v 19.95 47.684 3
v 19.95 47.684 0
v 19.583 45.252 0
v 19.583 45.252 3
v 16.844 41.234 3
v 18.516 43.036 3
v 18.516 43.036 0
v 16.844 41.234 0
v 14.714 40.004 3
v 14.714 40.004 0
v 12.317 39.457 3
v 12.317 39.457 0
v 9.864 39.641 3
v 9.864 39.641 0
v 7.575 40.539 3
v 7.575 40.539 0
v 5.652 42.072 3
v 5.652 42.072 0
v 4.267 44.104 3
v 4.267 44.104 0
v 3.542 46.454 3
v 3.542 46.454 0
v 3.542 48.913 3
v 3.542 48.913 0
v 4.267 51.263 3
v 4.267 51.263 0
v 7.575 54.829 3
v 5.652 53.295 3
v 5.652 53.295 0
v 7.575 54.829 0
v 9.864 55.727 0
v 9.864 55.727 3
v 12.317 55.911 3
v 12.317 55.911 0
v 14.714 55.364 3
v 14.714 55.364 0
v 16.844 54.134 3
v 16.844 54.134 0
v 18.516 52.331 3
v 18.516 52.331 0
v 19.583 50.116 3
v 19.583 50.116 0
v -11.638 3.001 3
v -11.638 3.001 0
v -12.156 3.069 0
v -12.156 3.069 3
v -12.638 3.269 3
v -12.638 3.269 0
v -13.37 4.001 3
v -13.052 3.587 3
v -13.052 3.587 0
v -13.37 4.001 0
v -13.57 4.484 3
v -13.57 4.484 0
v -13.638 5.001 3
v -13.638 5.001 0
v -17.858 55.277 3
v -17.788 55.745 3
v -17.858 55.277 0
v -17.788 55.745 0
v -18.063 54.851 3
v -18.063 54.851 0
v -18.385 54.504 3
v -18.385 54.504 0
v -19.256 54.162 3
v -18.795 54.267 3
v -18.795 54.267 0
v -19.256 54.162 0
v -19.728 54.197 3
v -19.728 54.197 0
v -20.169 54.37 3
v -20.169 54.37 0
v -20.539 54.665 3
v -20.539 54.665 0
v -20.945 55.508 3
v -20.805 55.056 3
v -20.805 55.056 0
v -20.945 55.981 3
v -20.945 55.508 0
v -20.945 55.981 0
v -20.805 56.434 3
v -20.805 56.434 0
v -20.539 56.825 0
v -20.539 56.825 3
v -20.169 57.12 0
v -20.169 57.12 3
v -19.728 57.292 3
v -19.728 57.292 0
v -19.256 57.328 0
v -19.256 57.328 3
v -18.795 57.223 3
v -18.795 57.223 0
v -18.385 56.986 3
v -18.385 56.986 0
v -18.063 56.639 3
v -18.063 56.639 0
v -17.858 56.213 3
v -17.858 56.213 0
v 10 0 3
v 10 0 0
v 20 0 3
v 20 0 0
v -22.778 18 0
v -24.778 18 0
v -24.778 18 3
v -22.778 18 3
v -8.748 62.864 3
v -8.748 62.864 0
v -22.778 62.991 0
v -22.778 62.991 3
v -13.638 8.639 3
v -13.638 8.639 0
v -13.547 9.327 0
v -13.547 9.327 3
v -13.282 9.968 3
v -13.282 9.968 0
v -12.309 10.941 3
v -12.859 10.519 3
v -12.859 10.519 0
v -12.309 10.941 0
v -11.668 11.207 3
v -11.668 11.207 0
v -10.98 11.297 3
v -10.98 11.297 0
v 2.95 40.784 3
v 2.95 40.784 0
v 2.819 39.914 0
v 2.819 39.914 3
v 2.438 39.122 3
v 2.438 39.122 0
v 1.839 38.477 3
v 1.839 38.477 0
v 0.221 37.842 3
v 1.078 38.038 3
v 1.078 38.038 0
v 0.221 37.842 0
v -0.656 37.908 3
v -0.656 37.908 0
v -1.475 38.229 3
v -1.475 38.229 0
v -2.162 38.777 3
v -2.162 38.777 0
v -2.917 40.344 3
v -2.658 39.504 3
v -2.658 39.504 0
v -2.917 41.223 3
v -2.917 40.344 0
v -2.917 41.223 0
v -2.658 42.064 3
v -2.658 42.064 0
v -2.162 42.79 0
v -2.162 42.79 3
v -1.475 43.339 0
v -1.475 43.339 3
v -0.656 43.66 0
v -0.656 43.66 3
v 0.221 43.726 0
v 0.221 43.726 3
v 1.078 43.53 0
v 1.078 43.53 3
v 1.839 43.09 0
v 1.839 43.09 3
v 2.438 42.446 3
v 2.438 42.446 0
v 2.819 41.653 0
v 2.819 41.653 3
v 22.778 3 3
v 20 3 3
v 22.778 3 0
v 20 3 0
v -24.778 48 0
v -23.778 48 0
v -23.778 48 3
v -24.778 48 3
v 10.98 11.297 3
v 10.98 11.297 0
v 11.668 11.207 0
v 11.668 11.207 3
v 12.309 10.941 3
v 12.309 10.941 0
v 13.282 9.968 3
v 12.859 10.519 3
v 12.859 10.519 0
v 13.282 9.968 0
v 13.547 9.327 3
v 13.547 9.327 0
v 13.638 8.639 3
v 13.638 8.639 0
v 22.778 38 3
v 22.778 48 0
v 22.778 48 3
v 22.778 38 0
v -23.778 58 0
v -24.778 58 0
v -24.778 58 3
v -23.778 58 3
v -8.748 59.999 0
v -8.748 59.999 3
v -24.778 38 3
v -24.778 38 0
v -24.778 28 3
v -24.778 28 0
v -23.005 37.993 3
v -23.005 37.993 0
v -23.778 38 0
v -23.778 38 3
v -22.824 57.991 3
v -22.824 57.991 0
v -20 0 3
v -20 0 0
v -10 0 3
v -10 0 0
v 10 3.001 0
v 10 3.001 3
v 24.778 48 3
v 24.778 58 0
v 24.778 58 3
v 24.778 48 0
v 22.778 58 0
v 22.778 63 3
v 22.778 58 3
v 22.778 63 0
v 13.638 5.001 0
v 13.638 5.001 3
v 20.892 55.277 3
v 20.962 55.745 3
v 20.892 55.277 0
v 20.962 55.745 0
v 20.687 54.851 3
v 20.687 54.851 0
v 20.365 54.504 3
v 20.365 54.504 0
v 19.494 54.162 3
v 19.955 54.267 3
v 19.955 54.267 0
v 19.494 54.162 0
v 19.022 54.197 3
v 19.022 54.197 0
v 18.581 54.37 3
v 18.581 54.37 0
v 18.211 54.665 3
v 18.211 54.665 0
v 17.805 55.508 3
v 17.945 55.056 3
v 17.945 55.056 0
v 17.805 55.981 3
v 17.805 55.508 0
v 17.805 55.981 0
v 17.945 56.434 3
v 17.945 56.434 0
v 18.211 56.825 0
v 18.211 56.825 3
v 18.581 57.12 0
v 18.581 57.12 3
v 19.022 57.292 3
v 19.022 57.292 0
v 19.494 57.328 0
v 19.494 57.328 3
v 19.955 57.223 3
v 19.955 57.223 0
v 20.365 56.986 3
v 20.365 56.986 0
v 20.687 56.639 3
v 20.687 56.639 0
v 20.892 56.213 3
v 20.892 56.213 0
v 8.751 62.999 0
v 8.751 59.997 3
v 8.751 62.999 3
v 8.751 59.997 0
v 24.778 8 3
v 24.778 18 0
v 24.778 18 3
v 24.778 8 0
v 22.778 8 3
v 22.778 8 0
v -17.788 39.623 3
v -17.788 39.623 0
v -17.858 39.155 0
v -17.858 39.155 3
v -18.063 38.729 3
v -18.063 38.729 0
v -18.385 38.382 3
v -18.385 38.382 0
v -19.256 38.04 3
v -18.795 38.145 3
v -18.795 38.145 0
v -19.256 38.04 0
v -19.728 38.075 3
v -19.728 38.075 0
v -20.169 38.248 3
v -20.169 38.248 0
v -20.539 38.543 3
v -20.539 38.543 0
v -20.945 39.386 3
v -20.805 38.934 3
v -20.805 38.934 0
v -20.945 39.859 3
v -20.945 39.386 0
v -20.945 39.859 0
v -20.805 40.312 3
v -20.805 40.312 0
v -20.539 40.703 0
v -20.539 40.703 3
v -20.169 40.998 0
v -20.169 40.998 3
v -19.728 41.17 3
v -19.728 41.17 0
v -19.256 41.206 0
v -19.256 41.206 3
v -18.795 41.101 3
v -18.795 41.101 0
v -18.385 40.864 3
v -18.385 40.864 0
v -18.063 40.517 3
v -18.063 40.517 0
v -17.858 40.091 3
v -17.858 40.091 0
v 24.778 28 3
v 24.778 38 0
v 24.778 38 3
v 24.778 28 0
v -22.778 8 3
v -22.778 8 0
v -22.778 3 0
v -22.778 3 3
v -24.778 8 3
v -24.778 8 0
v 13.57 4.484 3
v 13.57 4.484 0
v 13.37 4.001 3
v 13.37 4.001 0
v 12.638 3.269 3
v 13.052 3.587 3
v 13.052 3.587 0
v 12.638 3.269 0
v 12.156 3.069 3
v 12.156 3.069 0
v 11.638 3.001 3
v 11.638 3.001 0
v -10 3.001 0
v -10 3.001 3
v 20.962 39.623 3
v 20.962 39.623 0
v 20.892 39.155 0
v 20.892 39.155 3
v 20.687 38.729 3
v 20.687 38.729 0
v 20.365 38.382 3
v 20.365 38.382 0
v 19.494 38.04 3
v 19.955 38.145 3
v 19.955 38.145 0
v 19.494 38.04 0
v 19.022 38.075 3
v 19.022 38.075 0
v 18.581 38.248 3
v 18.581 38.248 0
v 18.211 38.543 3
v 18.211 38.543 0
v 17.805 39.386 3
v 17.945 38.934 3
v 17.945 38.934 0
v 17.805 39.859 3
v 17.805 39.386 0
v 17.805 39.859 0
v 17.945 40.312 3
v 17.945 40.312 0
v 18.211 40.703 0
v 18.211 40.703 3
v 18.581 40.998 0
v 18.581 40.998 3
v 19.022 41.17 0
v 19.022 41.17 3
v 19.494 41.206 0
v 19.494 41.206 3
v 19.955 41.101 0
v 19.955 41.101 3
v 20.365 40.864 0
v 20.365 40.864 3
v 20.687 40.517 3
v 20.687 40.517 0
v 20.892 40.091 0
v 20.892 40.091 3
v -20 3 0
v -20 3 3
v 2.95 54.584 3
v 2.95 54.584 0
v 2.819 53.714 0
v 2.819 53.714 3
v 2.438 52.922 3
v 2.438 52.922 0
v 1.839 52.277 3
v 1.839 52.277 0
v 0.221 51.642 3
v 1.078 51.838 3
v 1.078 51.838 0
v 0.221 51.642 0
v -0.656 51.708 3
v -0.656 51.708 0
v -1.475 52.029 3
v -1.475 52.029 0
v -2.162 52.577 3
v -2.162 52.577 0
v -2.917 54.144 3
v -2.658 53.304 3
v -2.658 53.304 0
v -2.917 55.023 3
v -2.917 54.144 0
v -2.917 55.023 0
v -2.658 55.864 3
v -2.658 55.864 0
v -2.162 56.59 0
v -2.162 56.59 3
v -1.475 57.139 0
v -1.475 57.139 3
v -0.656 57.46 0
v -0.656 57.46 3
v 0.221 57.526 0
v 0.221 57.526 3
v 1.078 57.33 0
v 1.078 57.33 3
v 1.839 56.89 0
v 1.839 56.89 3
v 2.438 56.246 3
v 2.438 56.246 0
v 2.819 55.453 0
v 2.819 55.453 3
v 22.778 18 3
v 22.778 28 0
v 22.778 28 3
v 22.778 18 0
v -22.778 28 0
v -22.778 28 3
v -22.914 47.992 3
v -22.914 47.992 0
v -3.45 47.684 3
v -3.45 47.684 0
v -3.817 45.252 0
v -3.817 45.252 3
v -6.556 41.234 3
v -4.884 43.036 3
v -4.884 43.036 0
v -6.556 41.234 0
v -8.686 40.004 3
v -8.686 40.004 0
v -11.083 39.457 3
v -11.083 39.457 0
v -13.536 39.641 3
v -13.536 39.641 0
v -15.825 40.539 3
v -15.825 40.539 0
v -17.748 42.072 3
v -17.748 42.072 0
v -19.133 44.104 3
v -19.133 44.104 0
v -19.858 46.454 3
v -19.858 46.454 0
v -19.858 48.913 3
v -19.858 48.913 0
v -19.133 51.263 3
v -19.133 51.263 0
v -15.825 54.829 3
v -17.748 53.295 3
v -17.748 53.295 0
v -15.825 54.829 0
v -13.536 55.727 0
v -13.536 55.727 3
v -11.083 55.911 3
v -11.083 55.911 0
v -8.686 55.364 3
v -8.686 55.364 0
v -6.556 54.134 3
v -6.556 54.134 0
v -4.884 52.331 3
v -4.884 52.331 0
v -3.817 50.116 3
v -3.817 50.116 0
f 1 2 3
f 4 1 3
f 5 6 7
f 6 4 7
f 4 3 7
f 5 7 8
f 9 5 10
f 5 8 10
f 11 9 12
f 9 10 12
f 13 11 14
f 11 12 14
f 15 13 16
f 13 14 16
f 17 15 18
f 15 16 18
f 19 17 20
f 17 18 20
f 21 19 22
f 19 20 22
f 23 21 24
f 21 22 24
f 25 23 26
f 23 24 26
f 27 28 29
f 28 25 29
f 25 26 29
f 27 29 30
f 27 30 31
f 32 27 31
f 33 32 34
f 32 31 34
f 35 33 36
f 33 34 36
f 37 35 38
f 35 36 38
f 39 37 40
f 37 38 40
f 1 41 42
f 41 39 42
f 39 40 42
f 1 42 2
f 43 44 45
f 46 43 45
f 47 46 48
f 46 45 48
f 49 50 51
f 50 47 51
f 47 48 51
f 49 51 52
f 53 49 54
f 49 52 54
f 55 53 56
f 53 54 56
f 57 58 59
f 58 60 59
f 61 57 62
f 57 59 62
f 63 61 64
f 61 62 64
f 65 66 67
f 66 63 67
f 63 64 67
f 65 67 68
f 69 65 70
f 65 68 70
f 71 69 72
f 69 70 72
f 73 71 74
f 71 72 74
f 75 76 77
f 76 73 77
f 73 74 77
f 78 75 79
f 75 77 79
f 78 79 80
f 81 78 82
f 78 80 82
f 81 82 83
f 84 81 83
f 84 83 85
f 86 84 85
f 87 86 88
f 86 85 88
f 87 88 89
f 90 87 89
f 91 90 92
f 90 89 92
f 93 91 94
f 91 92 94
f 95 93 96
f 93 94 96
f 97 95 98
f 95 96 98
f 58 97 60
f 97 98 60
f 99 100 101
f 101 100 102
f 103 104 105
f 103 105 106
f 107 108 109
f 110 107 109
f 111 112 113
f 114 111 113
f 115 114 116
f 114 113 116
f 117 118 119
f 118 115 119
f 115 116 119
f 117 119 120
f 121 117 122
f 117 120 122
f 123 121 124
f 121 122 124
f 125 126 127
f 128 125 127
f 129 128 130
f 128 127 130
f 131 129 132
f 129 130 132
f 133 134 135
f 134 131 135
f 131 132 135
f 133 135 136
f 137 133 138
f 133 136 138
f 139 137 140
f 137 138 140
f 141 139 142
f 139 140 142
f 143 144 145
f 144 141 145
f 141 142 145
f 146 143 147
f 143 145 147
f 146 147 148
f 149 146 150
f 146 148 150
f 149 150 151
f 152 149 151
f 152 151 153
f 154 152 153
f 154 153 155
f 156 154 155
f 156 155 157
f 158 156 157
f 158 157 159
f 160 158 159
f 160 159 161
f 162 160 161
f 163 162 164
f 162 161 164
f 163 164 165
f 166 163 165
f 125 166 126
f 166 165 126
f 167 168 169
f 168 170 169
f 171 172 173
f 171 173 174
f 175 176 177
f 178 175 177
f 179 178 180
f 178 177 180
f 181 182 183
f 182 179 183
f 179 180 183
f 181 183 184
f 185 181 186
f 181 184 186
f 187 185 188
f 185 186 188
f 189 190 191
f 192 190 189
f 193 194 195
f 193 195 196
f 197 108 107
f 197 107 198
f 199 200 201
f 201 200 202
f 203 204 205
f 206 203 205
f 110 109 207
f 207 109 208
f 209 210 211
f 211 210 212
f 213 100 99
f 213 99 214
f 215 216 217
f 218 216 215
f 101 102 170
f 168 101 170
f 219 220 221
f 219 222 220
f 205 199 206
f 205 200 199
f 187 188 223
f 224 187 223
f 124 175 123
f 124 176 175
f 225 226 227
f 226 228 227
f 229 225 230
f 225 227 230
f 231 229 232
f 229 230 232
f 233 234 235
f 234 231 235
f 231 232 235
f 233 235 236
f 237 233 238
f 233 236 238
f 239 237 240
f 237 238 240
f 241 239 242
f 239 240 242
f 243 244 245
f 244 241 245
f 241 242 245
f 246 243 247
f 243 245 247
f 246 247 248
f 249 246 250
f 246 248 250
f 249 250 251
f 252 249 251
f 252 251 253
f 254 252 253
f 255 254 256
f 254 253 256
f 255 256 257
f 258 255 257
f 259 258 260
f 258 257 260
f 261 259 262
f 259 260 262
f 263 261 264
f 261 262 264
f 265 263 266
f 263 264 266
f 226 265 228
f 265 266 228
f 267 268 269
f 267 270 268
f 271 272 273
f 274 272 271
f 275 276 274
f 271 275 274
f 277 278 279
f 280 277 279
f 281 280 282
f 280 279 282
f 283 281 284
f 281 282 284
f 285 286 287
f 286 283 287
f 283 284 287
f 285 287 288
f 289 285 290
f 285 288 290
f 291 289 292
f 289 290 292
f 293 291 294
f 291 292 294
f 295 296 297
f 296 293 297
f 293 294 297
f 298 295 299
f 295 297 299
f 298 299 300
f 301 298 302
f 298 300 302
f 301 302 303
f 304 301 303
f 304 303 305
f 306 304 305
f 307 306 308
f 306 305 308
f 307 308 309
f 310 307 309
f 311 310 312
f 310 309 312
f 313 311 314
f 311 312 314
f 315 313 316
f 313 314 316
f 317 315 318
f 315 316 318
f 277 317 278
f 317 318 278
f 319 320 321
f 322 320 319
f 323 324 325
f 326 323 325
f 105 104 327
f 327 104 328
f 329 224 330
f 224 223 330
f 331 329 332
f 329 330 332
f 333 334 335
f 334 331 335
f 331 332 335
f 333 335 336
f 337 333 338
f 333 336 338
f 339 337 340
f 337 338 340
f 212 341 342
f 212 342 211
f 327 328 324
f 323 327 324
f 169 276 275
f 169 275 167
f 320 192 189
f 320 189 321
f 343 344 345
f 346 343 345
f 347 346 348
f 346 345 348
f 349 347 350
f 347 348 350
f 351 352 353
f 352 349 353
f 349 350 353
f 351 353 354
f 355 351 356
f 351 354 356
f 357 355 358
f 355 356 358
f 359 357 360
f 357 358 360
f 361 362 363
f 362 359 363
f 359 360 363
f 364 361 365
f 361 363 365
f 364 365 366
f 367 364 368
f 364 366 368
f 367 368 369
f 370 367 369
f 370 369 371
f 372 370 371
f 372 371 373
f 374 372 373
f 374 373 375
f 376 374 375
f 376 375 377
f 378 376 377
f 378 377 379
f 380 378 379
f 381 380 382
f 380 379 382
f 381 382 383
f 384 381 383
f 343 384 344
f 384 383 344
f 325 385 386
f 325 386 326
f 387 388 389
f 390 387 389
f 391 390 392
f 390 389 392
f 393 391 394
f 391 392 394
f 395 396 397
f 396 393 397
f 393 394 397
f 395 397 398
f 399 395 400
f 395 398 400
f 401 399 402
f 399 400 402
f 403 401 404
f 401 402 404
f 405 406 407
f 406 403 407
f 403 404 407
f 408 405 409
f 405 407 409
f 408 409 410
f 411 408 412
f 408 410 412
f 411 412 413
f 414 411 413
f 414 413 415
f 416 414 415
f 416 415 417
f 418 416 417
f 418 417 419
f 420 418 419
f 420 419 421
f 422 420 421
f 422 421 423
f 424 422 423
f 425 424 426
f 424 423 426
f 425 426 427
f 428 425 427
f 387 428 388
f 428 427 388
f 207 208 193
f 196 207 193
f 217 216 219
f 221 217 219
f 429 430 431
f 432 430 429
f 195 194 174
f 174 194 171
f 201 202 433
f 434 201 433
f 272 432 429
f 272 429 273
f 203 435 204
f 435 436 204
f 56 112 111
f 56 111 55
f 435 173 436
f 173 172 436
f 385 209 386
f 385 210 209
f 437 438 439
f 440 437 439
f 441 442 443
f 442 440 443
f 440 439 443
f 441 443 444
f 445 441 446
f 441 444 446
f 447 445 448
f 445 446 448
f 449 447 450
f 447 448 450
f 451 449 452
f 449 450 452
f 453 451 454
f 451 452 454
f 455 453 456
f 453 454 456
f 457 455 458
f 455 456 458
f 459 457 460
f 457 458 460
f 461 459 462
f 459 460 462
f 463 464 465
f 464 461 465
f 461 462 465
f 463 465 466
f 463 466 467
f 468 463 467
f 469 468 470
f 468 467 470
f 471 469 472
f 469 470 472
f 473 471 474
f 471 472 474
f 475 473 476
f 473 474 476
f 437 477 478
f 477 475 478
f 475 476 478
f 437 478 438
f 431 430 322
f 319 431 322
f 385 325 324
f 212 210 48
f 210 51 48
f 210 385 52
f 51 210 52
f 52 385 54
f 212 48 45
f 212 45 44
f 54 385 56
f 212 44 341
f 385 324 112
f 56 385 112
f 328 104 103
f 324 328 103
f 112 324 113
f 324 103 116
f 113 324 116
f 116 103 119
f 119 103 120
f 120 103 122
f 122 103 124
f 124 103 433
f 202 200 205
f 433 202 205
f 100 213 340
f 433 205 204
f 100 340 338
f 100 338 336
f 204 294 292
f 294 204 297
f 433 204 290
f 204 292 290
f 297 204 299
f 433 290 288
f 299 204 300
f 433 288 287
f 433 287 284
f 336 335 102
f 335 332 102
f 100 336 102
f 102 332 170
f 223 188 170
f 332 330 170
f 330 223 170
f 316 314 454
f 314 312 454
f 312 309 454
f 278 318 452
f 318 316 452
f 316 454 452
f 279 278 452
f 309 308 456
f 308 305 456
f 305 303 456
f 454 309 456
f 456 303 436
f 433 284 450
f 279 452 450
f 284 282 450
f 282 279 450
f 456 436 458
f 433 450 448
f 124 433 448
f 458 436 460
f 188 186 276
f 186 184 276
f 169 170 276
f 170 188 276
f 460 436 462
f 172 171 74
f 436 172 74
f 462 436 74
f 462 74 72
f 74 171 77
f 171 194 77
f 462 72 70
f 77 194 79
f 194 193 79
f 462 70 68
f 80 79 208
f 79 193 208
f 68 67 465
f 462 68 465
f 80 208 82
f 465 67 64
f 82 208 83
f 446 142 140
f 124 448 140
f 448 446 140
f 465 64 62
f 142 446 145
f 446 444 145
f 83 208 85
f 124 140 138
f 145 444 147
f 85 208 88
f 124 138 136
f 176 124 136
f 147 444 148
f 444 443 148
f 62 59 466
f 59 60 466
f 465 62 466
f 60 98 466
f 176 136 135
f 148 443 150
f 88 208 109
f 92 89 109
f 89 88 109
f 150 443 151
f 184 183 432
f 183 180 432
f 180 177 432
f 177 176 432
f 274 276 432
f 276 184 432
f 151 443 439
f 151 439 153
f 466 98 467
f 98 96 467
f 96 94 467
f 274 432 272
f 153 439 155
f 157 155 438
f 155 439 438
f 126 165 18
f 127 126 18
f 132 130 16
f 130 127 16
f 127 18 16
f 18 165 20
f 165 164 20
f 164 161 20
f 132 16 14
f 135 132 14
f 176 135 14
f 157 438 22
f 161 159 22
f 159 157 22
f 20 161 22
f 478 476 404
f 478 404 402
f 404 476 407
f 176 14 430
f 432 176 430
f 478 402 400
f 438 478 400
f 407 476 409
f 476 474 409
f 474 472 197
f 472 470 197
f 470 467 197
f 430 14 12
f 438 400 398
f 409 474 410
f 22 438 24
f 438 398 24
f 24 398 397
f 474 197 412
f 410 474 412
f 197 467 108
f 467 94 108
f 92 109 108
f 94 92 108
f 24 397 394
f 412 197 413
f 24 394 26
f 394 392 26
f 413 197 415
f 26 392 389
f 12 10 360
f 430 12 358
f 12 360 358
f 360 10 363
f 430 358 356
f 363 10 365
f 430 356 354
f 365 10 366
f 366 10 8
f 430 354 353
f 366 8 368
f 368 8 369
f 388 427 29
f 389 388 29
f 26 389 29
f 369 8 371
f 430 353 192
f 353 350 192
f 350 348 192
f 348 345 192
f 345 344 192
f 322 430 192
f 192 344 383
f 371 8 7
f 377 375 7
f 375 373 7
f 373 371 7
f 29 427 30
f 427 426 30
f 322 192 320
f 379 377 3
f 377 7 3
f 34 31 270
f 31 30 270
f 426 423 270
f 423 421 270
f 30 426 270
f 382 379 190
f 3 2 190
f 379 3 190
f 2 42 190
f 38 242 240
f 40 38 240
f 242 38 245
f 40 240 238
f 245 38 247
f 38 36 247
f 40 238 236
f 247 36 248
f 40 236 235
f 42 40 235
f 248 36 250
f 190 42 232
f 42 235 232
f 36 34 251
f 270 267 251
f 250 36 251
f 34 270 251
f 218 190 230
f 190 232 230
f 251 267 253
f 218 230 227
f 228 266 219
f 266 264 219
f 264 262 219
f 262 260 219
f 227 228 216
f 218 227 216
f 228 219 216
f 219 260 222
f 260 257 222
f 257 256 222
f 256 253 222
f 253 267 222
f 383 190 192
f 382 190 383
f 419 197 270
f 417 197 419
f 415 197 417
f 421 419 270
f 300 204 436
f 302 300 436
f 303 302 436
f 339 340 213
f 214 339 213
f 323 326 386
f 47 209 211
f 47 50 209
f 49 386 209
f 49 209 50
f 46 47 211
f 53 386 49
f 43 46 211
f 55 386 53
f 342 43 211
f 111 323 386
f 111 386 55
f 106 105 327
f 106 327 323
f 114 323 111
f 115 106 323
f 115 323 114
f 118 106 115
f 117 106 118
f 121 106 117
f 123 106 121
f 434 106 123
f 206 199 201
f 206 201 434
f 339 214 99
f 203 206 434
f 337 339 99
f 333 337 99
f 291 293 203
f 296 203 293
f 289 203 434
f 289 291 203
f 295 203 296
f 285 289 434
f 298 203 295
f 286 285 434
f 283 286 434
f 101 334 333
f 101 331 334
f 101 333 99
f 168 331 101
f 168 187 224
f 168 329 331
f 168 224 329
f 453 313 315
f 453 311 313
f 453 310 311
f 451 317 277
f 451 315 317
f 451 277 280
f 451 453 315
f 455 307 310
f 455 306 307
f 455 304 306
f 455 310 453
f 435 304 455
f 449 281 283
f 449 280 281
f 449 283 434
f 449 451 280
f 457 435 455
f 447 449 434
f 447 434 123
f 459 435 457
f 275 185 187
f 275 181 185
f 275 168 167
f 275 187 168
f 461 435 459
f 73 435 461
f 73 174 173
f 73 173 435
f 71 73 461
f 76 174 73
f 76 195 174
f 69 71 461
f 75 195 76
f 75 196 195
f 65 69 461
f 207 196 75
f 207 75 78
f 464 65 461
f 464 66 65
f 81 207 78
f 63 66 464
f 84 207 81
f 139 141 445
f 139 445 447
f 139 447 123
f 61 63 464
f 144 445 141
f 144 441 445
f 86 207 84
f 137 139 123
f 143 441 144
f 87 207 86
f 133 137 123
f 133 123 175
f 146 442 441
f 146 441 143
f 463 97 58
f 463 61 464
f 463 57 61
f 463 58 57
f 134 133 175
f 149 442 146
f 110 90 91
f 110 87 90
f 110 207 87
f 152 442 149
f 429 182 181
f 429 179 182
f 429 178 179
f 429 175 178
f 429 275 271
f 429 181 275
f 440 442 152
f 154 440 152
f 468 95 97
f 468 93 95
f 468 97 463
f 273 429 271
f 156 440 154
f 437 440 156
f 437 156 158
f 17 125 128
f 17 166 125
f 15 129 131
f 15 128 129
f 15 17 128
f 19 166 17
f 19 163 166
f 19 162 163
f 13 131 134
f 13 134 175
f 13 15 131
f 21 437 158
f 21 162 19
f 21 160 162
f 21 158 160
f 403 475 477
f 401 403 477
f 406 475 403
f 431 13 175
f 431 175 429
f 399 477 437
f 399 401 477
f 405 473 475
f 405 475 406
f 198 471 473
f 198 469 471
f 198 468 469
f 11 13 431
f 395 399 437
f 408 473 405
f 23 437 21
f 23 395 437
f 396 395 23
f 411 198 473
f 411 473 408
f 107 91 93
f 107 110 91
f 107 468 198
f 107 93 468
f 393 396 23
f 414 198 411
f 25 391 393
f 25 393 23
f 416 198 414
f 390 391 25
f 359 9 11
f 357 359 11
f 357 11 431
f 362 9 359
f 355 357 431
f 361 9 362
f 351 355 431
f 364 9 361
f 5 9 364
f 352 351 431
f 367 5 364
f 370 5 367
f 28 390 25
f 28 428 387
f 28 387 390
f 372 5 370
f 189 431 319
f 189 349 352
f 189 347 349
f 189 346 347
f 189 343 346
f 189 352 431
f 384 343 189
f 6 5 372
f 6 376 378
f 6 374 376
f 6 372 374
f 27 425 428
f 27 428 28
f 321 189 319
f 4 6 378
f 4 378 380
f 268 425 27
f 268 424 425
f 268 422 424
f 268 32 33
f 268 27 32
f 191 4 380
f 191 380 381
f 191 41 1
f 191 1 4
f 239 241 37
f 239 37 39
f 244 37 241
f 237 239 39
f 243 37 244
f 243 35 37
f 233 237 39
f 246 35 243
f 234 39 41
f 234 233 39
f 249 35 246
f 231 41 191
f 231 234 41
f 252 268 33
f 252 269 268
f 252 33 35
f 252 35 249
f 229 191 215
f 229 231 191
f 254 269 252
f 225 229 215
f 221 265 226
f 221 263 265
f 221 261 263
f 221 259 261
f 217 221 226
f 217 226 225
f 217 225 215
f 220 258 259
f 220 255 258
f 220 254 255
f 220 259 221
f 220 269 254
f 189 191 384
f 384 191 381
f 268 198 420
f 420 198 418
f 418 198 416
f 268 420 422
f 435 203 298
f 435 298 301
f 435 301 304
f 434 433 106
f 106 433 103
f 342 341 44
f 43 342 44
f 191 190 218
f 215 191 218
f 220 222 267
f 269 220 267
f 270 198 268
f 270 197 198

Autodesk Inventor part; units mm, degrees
ref_plane "YZ Plane" through (0, 0, 0) normal (1, 0, 0) x (0, 1, 0)
ref_plane "XZ Plane" through (0, 0, 0) normal (0, 1, 0) x (-1, 0, 0)
ref_plane "XY Plane" through (0, 0, 0) normal (0, 0, 1) x (1, 0, 0)
sketch "Sketch1" plane through (0, 0, 0) normal (0, 0, 1) x (1, 0, 0)
  line L0 (23.778, 63) -> (8.751, 62.999)
  line L1 (8.7511, 59.9974) -> (8.751, 62.999)
  line L2 (-8.7484, 59.9988) -> (8.7511, 59.9974)
  line L3 (-8.7482, 62.8637) -> (-8.7484, 59.9988)
  line L4 (-8.7482, 62.8637) -> (-23.7781, 63.0002)
  circle A0 centre (11.7, 47.6838) radius 8.25
  circle A1 centre (-11.7, 47.6838) radius 8.25
  circle A2 centre (0.0002, 40.7838) radius 2.95
  circle A3 centre (19.375, 39.6228) radius 1.5875
  circle A4 centre (-19.375, 55.7448) radius 1.5875
  line L5 (10.98, 11.2972) -> (-10.98, 11.2972)
  arc A5 (13.638, 8.6392) -> (10.98, 11.2972) centre (10.98, 8.6392) ccw
  arc A6 (-10.98, 11.2972) -> (-13.638, 8.6392) centre (-10.98, 8.6392) ccw
  line L6 (-0.0001, 27) -> (-7.6501, 27) construction
  line L7 (-7.6501, 27) -> (-0.0001, 27) construction
  line L8 (-0.0001, 34) -> (-0.0001, 27) construction
  line L9 (10, 0) -> (20, 0)
  line L10 (-20, 0) -> (-10, 0)
  line L11 (-5, 0) -> (5, 0) construction
  line L12 (20, 0) -> (20, 3.0003)
  line L13 (20, 3.0003) -> (23.778, 3)
  line L14 (10, 0) -> (10, 3.0012)
  line L15 (-10, 3.0012) -> (-10, 0)
  line L16 (-20, 0) -> (-20, 3)
  line L17 (-20, 3) -> (-23.7781, 3)
  line L18 (13.638, 8.6392) -> (13.638, 5.0012)
  line L19 (-13.638, 8.6392) -> (-13.638, 5.0012)
  line L20 (11.638, 3.0012) -> (10, 3.0012)
  line L21 (-10, 3.0012) -> (-11.638, 3.0012)
  arc A7 (11.638, 3.0012) -> (13.638, 5.0012) centre (11.638, 5.0012) ccw
  arc A8 (-13.638, 5.0012) -> (-11.638, 3.0012) centre (-11.638, 5.0012) ccw
  line L22 (23.778, 28) -> (26.778, 28)
  line L23 (26.778, 28) -> (26.778, 38)
  line L24 (26.778, 38) -> (23.778, 38)
  line L25 (23.778, 48) -> (26.778, 48)
  line L26 (26.778, 48) -> (26.778, 58)
  line L27 (26.778, 58) -> (23.778, 58)
  line L28 (23.778, 8) -> (26.778, 8)
  line L29 (26.778, 8) -> (26.778, 18)
  line L30 (26.778, 18) -> (23.778, 18)
  line L31 (23.778, 28) -> (26.778, 28)
  line L32 (26.778, 28) -> (26.778, 38)
  line L33 (26.778, 38) -> (23.778, 38)
  line L34 (23.778, 48) -> (23.778, 38)
  line L35 (23.778, 28) -> (23.778, 18)
  line L36 (23.778, 8) -> (23.778, 3)
  line L37 (-23.7781, 28) -> (-26.7781, 28)
  line L38 (-26.7781, 28) -> (-26.7781, 38)
  line L39 (-26.7781, 38) -> (-23.7781, 38)
  line L40 (-26.7781, 48) -> (-26.7781, 58)
  line L41 (-26.7781, 58) -> (-23.7781, 58)
  line L42 (-23.7781, 48) -> (-26.7781, 48)
  line L43 (-26.7781, 8) -> (-26.7781, 18)
  line L44 (-26.7781, 18) -> (-23.7781, 18)
  line L45 (-23.7781, 8) -> (-26.7781, 8)
  line L46 (-26.7781, 28) -> (-26.7781, 38)
  line L47 (-26.7781, 38) -> (-23.7781, 38)
  line L48 (-23.7781, 28) -> (-26.7781, 28)
  line L49 (-23.7781, 48) -> (-23.7781, 38)
  line L50 (-23.7781, 28) -> (-23.7781, 18)
  circle A9 centre (0.0002, 54.5838) radius 2.95
  line L51 (0.0002, 50) -> (0.0002, 45) construction
  line L52 (10, 47.6838) -> (6, 47.6838) construction
  circle A10 centre (19.375, 55.7448) radius 1.5875
  circle A11 centre (-19.375, 39.6228) radius 1.5875
  line L53 (-23.7781, 3) -> (-23.7781, 8)
  line L54 (23.778, 63) -> (23.778, 58)
  line L55 (-23.7781, 63.0002) -> (-23.7781, 58)
  line L56 (23.778, 63) -> (23.778, 62.5)
  line L57 (23.778, 63) -> (22.778, 63)
  line L58 (23.778, 63) -> (24.778, 63) construction
  line L59 (22.778, 63) -> (22.778, 58)
  line L60 (22.778, 58) -> (23.778, 58)
  line L61 (23.778, 48) -> (22.778, 48)
  line L62 (22.778, 48) -> (22.778, 38)
  line L63 (22.778, 38) -> (23.778, 38)
  line L64 (23.778, 28) -> (22.778, 28)
  line L65 (22.778, 28) -> (22.778, 18)
  line L66 (22.778, 18) -> (23.778, 18)
  line L67 (23.778, 8) -> (22.778, 8)
  line L68 (22.778, 8) -> (22.7776, 3.0001)
  line L69 (-23.7781, 63.0002) -> (-23.7781, 62.5002)
  line L70 (-23.7781, 63.0002) -> (-22.7781, 62.9911)
  line L71 (-22.7781, 62.9911) -> (-22.8235, 57.9913)
  line L72 (-22.8235, 57.9913) -> (-23.7781, 58)
  line L73 (-23.7781, 48) -> (-22.9143, 47.9922)
  line L74 (-22.9143, 47.9922) -> (-23.0051, 37.9926)
  line L75 (-23.0051, 37.9926) -> (-24.0051, 38)
  line L76 (-23.7781, 28) -> (-22.7781, 28)
  line L77 (-22.7781, 28) -> (-22.7781, 18)
  line L78 (-22.7781, 18) -> (-23.7781, 18)
  line L79 (-23.7781, 8) -> (-22.7781, 8)
  line L80 (-23.7781, 8) -> (-22.7781, 8) construction
  line L81 (-22.7781, 8) -> (-22.7781, 3)
  point P0 (0, 0)
  point P1 (0, 1.5)
  point P2 (15, 0)
  point P3 (15, 1.5)
  point P4 (-15, 0)
  point P5 (-15, 1.5)
  point P6 (0, 0)
  point P7 (0, 1.5)
  point P8 (13.638, 3.0012)
  point P9 (-23.7781, 23)
  dimension "d4" = 15
  dimension "d7" = 15
  dimension "d11" = 2
  dimension "d12" = 3
  dimension "d16" = 20
  dimension "d19" = 20
  dimension "d46" = 7.675
  dimension "d47" = 7.675
  dimension "d50" = 0.5
  dimension "d51" = 1
  dimension "d52" = 180
  dimension "d53" = 10
  dimension "d54" = 10
  dimension "d55" = 90
  dimension "d56" = 1
  dimension "d57" = 0.5
  dimension "d58" = 1
  dimension "d59" = 5
  dimension "d60" = 10
  dimension "d61" = 1
  dimension "d62" = 1
  dimension "d63" = 1
  dimension "d64" = 0
  dimension "d67" = 8.061
  dimension "d68" = 8.061
  dimension "d69" = 1
  dimension "d70" = 1
extrude "Extrusion1" add sketch "Sketch1" along normal blind 3
extrude "Extrusion2" cut sketch "Sketch1" along normal up to next contours L54 L60 L59 L0 | L34 L63 L62 L61 | L71 L72 L55 L4 | L35 L66 L65 L64 | L73 L74 L75 L49 | L36 L13 L68 L67 | L76 L77 L78 L50 | L79 L81 L17 L53
sketch "Sketch2" plane through (0, 0, 0) normal (0, 0, -1) x (-1, 0, 0)
  line L0 (-22.778, 8) -> (-26.778, 8) projected
  line L1 (-26.778, 58) -> (-24.778, 58)
  line L2 (-24.778, 58) -> (-24.778, 8)
  line L3 (-24.778, 8) -> (-26.778, 8)
  line L4 (-26.778, 8) -> (-26.778, 58)
  line L5 (26.7781, 8) -> (22.7781, 8) projected
  line L6 (26.7781, 58) -> (24.7781, 58)
  line L7 (24.7781, 58) -> (24.7781, 8)
  line L8 (24.7781, 8) -> (26.7781, 8)
  line L9 (26.7781, 8) -> (26.7781, 58)
  point P0 (0, 0)
extrude "Extrusion3" cut sketch "Sketch2" against normal through all
equation "\"d56\" = d51"
equation "\"d58\" = d51"
equation "\"d61\" = d51"
equation "\"d62\" = d51"
equation "\"d63\" = d51"
equation "\"d68\" = d67"
equation "\"d69\" = d51"
equation "\"d70\" = d51"
properties part number "srf depan"
